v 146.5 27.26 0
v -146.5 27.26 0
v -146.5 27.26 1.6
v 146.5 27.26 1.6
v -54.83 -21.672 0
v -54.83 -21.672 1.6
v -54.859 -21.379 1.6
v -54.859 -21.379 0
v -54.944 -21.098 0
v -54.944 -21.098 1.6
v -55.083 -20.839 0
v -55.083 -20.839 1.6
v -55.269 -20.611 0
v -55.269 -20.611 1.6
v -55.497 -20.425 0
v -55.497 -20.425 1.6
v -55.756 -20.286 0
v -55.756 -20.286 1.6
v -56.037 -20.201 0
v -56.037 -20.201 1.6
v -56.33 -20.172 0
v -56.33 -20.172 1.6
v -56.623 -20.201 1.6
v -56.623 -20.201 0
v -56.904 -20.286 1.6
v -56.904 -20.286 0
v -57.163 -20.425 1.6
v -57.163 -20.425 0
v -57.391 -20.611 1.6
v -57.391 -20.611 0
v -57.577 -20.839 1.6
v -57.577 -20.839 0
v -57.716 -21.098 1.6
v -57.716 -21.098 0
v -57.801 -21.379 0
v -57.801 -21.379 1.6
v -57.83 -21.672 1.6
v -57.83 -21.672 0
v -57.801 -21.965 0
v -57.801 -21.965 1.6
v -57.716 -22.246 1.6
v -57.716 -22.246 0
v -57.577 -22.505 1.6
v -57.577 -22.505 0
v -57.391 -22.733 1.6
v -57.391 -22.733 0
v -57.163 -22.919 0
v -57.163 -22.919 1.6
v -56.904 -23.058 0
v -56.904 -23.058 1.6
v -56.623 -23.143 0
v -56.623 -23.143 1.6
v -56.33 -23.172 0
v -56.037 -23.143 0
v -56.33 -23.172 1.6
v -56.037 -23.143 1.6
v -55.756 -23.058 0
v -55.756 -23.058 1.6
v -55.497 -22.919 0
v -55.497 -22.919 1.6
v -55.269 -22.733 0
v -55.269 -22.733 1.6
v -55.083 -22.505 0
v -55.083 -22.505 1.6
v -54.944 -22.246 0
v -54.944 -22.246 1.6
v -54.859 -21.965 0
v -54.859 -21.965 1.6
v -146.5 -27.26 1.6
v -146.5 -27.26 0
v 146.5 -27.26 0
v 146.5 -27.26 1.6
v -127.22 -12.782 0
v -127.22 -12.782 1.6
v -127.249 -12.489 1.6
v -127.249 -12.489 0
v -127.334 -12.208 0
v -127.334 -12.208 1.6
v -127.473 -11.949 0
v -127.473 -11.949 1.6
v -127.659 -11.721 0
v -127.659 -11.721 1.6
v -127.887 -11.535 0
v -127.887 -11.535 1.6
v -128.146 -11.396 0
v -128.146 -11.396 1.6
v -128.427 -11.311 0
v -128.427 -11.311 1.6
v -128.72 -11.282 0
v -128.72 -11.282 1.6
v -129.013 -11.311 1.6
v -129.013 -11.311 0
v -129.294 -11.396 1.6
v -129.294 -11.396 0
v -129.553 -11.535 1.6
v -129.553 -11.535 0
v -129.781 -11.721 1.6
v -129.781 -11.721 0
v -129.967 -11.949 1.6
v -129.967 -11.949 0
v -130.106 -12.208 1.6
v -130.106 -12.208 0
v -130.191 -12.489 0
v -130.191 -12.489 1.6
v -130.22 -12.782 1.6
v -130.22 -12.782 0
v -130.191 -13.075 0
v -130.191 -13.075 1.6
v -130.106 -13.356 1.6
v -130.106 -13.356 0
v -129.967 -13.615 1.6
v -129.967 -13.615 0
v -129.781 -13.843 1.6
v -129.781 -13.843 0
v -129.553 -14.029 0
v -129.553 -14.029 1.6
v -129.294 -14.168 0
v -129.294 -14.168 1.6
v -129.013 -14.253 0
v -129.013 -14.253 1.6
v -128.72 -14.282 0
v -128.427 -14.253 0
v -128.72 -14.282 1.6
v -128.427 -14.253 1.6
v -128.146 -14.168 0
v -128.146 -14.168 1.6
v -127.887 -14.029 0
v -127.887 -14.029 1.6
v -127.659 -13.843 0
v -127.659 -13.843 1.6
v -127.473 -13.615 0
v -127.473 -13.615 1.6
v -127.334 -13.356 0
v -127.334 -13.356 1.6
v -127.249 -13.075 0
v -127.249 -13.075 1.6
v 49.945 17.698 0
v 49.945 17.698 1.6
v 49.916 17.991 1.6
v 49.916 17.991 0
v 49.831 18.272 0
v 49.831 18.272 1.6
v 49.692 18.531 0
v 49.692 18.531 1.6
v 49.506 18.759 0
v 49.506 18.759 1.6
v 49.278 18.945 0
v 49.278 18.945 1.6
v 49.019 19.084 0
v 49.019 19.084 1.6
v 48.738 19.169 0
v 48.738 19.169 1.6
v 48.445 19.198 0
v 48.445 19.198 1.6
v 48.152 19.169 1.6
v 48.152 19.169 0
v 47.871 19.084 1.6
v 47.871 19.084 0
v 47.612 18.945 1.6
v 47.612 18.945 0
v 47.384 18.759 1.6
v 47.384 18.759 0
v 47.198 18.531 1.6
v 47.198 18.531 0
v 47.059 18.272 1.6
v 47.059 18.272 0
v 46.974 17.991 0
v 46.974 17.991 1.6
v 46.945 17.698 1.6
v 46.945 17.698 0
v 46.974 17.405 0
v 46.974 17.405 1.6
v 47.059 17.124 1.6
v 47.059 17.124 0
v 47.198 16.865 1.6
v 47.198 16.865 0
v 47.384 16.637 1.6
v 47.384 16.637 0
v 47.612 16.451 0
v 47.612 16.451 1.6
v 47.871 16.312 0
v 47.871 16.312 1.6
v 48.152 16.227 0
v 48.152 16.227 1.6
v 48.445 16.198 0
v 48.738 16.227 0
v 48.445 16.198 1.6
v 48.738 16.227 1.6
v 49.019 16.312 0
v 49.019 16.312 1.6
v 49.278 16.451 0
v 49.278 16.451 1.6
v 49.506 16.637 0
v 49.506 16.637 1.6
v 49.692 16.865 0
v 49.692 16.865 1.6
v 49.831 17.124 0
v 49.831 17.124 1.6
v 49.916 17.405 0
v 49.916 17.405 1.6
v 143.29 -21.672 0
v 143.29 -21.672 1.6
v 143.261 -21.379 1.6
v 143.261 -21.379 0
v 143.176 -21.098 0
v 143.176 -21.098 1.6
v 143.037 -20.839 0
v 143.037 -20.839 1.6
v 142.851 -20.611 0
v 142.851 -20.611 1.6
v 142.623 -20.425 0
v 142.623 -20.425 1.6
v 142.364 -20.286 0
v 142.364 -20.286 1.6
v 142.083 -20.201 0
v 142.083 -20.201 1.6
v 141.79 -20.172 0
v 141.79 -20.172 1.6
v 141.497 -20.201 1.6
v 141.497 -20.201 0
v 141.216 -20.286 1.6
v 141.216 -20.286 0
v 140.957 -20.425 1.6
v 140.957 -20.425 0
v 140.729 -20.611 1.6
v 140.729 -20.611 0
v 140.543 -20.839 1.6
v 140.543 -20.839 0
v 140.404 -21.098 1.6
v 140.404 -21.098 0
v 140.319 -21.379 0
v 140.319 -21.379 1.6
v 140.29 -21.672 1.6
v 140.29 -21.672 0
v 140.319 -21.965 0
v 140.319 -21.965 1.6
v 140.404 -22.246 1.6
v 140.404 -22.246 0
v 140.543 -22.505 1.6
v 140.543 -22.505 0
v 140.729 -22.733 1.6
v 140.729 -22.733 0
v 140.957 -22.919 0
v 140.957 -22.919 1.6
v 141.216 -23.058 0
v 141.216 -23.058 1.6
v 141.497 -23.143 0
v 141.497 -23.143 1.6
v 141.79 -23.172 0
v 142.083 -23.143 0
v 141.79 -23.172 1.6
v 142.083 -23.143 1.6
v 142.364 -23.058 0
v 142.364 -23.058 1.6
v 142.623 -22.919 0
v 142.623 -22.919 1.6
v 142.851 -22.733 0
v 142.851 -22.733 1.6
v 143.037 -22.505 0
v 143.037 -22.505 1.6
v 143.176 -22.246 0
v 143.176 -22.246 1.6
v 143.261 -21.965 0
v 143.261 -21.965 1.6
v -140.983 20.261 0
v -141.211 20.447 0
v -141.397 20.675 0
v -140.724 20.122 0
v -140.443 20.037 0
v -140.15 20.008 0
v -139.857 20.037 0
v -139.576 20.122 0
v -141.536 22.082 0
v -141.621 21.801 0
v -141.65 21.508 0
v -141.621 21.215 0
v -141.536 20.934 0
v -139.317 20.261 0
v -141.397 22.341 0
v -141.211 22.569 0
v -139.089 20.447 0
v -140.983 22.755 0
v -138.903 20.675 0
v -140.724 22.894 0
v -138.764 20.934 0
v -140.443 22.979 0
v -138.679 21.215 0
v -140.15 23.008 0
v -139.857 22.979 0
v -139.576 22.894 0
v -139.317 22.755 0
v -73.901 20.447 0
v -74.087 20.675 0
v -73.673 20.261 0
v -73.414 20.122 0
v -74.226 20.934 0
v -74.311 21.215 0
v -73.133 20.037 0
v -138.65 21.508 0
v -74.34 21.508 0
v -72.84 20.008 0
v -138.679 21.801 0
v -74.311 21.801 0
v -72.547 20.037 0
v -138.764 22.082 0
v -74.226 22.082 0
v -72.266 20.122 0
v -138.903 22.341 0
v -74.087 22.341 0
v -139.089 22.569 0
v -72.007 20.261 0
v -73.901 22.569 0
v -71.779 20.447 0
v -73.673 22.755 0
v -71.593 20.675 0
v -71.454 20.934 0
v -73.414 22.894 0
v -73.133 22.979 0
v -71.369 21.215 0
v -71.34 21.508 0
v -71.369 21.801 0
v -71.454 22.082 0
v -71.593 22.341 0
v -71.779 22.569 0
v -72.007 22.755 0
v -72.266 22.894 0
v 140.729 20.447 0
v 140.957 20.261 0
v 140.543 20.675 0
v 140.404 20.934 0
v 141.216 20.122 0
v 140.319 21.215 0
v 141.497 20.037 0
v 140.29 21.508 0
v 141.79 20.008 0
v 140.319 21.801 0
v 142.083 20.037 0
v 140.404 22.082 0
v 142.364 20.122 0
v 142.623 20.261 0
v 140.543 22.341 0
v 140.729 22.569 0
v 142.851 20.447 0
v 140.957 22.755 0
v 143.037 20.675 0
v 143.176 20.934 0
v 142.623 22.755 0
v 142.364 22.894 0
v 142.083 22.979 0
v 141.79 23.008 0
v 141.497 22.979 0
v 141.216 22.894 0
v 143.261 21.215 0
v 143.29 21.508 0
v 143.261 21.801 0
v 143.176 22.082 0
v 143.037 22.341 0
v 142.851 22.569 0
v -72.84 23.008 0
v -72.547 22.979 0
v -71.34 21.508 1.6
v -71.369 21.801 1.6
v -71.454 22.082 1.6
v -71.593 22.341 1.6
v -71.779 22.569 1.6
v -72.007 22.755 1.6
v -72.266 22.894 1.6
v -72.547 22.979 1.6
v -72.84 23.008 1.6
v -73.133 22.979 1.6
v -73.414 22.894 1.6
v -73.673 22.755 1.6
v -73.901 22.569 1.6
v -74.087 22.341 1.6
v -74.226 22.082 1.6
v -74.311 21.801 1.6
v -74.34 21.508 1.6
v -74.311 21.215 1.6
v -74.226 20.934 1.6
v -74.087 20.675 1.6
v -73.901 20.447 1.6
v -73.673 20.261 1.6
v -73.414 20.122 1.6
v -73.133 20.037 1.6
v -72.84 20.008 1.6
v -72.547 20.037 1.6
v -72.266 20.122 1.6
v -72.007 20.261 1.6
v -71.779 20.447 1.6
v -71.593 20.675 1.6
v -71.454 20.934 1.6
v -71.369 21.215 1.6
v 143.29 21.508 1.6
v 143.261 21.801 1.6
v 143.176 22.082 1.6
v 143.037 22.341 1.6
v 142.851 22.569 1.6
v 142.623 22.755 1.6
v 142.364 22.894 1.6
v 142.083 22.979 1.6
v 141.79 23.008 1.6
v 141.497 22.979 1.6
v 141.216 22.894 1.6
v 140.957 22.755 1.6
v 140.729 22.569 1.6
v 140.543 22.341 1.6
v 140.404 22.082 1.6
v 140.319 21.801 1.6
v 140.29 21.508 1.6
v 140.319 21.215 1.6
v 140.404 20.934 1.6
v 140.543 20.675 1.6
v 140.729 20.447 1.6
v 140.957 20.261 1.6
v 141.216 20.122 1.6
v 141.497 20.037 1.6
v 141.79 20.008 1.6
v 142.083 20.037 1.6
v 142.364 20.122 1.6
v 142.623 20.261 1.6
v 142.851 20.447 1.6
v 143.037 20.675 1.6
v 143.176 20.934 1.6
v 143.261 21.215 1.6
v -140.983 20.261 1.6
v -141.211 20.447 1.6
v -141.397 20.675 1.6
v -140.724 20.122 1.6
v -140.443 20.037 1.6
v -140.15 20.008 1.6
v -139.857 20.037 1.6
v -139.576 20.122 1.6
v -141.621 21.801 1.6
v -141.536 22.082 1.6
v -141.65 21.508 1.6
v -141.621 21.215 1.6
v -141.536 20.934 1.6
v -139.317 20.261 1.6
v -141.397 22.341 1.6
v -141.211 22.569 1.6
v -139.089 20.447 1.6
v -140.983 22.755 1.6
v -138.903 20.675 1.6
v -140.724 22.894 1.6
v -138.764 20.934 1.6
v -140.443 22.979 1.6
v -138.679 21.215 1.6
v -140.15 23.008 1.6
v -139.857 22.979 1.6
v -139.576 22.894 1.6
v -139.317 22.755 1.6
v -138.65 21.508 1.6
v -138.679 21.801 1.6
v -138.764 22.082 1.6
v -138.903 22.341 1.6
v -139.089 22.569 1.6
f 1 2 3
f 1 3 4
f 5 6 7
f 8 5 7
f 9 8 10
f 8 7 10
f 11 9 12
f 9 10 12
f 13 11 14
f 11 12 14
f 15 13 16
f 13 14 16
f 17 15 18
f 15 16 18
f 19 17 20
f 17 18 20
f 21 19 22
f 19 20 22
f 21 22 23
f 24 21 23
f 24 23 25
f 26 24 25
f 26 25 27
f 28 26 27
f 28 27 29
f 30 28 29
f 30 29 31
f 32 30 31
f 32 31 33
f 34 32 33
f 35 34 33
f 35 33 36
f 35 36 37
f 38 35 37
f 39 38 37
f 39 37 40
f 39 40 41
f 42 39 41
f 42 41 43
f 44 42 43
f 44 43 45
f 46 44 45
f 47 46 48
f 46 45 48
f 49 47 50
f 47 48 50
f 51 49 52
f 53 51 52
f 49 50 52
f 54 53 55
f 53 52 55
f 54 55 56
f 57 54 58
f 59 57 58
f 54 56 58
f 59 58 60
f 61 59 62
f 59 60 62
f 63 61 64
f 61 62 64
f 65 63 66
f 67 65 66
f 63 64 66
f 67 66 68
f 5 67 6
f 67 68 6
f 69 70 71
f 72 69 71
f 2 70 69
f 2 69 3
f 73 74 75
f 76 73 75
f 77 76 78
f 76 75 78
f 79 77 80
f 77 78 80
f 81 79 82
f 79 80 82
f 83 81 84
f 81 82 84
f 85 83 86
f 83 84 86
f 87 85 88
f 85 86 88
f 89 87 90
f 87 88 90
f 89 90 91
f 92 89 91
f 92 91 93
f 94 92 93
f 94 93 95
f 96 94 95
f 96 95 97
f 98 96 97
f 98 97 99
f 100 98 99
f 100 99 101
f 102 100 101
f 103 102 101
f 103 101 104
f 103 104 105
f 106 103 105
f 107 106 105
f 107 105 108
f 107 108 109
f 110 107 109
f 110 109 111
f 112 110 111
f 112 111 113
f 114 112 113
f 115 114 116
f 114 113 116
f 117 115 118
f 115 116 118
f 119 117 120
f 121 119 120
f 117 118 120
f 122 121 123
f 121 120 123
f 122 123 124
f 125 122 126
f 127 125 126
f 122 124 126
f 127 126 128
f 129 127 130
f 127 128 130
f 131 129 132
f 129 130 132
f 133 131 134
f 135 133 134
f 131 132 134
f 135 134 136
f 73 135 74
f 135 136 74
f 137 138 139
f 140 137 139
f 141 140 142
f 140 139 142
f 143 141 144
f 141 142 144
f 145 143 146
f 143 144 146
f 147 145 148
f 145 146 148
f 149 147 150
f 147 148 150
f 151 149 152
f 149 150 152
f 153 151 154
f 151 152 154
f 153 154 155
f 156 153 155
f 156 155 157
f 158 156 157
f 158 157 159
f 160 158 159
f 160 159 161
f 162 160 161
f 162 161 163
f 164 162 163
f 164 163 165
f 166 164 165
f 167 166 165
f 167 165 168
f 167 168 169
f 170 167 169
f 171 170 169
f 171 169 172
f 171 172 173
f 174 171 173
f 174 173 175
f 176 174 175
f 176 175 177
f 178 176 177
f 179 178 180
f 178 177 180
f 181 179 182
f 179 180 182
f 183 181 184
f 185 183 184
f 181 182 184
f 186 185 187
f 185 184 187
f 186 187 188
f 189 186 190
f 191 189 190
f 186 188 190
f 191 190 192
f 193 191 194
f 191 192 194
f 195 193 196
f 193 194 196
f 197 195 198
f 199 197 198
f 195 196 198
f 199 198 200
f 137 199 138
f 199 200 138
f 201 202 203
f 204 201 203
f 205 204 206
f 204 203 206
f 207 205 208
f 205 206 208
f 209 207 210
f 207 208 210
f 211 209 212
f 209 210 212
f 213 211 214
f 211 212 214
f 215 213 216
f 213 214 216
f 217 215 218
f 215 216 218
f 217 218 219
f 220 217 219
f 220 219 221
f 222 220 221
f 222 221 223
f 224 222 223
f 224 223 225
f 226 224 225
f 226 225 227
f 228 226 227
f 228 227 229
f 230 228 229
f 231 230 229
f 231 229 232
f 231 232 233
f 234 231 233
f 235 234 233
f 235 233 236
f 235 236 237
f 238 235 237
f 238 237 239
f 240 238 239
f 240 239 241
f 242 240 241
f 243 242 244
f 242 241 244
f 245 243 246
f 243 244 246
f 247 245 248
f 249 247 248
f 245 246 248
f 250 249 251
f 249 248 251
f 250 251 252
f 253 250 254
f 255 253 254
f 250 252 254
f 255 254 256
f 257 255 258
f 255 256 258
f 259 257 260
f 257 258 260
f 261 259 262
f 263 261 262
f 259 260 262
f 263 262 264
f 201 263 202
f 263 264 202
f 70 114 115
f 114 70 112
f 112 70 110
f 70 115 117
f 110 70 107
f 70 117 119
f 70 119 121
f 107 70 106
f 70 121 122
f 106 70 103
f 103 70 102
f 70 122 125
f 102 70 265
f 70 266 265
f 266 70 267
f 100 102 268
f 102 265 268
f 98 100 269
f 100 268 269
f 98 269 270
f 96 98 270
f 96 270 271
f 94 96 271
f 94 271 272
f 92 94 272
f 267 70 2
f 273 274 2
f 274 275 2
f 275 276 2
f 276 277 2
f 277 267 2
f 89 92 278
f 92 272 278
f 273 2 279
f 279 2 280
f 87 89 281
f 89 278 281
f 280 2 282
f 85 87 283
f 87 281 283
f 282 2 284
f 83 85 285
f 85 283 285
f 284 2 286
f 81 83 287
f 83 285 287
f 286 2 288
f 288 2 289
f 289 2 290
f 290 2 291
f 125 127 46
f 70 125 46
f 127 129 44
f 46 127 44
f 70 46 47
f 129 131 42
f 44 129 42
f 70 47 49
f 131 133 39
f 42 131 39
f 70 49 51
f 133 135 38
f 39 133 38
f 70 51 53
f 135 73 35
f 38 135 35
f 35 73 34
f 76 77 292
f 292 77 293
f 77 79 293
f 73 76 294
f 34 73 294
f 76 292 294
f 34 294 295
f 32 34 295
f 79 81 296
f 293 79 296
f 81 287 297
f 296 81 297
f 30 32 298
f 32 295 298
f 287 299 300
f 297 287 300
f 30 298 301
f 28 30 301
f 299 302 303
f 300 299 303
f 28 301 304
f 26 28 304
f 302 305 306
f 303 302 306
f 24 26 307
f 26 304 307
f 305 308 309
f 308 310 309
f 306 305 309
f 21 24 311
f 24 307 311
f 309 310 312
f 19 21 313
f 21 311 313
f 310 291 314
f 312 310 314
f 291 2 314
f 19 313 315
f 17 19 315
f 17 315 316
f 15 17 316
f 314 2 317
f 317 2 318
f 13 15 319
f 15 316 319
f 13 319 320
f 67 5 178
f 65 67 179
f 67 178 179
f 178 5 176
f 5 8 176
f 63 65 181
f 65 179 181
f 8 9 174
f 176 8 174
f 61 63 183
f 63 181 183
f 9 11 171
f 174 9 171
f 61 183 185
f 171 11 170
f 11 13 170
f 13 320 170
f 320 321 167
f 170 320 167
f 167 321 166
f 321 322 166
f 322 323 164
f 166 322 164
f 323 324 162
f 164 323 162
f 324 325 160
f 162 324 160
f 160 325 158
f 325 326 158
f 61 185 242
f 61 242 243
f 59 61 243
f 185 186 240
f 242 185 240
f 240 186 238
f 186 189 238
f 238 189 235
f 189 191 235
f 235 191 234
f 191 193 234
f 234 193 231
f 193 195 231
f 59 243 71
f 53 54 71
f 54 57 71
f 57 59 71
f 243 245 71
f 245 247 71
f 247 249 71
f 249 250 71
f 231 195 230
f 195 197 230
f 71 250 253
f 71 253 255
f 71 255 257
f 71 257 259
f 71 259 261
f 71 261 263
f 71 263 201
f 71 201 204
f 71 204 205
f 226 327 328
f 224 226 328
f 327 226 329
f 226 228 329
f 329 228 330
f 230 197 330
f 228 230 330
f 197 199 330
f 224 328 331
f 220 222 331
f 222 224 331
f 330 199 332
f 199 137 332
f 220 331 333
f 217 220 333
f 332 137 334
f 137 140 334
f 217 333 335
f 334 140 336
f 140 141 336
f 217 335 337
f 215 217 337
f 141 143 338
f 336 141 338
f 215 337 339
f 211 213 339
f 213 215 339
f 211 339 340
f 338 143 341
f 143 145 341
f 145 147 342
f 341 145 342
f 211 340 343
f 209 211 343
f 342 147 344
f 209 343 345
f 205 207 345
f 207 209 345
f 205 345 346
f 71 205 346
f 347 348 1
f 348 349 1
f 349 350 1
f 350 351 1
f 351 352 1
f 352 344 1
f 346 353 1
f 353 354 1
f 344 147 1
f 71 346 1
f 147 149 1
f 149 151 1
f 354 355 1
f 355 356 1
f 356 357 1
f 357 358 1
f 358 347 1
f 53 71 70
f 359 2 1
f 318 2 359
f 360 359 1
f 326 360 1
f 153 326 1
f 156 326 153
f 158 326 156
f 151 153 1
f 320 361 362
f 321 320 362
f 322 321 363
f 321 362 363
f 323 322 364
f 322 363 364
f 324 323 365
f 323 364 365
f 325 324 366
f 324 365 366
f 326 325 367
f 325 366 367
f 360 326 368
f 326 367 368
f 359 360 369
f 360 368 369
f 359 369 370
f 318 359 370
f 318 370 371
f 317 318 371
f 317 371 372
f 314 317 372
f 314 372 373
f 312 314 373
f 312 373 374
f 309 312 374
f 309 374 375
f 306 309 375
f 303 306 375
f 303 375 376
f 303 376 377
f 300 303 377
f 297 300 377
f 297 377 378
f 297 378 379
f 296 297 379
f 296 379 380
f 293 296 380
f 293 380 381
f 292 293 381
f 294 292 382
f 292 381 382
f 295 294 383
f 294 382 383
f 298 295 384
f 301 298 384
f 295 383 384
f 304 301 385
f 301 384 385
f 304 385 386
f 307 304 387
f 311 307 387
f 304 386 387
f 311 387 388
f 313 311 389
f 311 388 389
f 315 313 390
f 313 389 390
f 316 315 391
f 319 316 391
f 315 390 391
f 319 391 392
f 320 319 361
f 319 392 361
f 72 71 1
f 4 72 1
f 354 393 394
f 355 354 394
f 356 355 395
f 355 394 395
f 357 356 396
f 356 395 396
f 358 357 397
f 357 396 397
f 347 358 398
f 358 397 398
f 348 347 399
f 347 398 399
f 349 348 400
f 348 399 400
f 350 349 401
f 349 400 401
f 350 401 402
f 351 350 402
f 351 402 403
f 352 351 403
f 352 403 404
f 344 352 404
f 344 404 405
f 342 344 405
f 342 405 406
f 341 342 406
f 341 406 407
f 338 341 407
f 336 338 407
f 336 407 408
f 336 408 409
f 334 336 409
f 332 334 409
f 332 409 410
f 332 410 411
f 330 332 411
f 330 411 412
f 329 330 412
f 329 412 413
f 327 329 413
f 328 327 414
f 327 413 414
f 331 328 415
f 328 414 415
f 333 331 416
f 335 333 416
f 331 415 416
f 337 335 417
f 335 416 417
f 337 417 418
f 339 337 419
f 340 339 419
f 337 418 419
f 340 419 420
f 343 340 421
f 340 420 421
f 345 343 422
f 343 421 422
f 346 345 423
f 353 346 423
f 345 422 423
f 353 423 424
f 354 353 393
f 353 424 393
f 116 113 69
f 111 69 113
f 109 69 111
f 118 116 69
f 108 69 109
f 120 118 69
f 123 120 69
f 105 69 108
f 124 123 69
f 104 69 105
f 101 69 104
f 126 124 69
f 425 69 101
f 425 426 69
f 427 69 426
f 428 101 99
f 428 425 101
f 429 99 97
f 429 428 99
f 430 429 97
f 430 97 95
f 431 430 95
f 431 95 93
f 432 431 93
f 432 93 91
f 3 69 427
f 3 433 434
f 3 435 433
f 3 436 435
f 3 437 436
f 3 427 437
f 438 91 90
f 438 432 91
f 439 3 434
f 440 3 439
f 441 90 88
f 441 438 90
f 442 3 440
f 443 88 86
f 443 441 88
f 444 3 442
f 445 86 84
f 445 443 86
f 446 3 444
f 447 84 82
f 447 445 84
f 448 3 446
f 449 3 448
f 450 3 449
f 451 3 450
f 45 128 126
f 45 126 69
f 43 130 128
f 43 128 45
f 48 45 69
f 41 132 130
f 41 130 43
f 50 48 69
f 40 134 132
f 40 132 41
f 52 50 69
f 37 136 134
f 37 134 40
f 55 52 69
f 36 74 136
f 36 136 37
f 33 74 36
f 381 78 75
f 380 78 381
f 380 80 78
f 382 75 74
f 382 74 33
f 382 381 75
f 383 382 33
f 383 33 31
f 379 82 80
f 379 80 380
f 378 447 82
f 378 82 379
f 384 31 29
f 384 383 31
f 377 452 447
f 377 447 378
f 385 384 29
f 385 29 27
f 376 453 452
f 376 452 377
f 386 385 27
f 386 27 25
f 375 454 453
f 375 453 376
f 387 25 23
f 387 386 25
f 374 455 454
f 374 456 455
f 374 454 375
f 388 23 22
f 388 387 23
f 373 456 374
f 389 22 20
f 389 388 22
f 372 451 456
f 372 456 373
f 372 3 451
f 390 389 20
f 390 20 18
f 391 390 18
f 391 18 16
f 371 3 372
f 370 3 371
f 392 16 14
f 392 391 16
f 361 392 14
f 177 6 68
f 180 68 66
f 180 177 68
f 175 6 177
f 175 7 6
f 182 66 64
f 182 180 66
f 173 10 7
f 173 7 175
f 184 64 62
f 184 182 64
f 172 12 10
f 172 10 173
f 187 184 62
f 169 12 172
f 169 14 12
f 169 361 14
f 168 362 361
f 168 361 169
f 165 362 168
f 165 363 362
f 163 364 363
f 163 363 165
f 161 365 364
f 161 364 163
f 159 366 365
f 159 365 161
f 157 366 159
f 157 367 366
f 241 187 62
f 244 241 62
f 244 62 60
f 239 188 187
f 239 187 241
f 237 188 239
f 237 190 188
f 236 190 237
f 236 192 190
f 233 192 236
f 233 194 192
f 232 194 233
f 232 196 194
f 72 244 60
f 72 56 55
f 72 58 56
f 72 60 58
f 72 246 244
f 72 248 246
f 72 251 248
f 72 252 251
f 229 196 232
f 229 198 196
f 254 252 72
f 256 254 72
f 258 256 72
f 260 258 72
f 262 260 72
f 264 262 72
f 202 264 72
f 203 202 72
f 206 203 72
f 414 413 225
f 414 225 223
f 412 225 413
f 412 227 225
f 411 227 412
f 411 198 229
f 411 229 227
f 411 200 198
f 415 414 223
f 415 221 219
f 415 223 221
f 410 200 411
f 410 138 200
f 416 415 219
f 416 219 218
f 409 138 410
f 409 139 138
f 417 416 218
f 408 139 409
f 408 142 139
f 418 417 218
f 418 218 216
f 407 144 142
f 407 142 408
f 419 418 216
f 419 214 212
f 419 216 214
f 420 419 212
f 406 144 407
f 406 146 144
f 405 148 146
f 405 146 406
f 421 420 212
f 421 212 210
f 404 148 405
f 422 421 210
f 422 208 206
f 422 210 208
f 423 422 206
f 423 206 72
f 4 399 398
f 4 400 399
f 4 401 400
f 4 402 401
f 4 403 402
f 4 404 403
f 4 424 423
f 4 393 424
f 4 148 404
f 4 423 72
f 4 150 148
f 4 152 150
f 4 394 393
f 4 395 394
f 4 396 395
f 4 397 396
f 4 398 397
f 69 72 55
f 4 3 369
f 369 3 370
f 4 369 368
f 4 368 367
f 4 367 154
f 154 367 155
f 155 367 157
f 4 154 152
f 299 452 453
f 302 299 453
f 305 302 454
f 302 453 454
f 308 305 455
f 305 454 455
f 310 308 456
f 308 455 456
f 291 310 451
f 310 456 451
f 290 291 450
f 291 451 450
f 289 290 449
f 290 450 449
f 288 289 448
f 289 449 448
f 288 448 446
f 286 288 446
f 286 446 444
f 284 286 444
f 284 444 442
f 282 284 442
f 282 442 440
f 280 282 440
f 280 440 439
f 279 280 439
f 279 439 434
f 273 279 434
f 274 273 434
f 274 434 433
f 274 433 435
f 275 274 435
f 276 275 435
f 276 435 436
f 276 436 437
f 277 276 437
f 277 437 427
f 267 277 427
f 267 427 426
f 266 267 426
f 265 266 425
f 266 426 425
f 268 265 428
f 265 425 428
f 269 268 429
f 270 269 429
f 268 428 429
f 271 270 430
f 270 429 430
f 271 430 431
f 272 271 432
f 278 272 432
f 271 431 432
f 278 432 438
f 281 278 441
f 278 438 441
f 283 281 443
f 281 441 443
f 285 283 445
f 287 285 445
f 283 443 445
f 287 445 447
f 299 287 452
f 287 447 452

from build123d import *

# Parameters (mm, degrees)
SKETCH2_W                       = 293
SKETCH2_H                       = 54.52
EXTRUDEDBASE_PCB_DEPTH          = 1.6
SKETCH3_R                       = 1.5
EXTRUDEDCUT_MOUNTINGHOLES_DEPTH = 150.023211615


with BuildPart() as part:
    # Sketch2 → ExtrudedBase_PCB (new body)
    with BuildSketch(Plane.XY):
        Rectangle(SKETCH2_W, SKETCH2_H)
    extrude(amount=EXTRUDEDBASE_PCB_DEPTH)

    # Sketch3 → ExtrudedCut_MountingHoles (cut, through all)
    with BuildSketch(Plane.XY.offset(1.6)):
        with Locations((-140.15, 21.508)):
            Circle(SKETCH3_R)
        with Locations((-72.84, 21.508)):
            Circle(SKETCH3_R)
        with Locations((48.445, 17.698)):
            Circle(SKETCH3_R)
        with Locations((141.79, 21.508)):
            Circle(SKETCH3_R)
        with Locations((-128.72, -12.782)):
            Circle(SKETCH3_R)
        with Locations((-56.33, -21.672)):
            Circle(SKETCH3_R)
        with Locations((141.79, -21.672)):
            Circle(SKETCH3_R)
    extrude(amount=-EXTRUDEDCUT_MOUNTINGHOLES_DEPTH, mode=Mode.SUBTRACT)


solid = part.part
